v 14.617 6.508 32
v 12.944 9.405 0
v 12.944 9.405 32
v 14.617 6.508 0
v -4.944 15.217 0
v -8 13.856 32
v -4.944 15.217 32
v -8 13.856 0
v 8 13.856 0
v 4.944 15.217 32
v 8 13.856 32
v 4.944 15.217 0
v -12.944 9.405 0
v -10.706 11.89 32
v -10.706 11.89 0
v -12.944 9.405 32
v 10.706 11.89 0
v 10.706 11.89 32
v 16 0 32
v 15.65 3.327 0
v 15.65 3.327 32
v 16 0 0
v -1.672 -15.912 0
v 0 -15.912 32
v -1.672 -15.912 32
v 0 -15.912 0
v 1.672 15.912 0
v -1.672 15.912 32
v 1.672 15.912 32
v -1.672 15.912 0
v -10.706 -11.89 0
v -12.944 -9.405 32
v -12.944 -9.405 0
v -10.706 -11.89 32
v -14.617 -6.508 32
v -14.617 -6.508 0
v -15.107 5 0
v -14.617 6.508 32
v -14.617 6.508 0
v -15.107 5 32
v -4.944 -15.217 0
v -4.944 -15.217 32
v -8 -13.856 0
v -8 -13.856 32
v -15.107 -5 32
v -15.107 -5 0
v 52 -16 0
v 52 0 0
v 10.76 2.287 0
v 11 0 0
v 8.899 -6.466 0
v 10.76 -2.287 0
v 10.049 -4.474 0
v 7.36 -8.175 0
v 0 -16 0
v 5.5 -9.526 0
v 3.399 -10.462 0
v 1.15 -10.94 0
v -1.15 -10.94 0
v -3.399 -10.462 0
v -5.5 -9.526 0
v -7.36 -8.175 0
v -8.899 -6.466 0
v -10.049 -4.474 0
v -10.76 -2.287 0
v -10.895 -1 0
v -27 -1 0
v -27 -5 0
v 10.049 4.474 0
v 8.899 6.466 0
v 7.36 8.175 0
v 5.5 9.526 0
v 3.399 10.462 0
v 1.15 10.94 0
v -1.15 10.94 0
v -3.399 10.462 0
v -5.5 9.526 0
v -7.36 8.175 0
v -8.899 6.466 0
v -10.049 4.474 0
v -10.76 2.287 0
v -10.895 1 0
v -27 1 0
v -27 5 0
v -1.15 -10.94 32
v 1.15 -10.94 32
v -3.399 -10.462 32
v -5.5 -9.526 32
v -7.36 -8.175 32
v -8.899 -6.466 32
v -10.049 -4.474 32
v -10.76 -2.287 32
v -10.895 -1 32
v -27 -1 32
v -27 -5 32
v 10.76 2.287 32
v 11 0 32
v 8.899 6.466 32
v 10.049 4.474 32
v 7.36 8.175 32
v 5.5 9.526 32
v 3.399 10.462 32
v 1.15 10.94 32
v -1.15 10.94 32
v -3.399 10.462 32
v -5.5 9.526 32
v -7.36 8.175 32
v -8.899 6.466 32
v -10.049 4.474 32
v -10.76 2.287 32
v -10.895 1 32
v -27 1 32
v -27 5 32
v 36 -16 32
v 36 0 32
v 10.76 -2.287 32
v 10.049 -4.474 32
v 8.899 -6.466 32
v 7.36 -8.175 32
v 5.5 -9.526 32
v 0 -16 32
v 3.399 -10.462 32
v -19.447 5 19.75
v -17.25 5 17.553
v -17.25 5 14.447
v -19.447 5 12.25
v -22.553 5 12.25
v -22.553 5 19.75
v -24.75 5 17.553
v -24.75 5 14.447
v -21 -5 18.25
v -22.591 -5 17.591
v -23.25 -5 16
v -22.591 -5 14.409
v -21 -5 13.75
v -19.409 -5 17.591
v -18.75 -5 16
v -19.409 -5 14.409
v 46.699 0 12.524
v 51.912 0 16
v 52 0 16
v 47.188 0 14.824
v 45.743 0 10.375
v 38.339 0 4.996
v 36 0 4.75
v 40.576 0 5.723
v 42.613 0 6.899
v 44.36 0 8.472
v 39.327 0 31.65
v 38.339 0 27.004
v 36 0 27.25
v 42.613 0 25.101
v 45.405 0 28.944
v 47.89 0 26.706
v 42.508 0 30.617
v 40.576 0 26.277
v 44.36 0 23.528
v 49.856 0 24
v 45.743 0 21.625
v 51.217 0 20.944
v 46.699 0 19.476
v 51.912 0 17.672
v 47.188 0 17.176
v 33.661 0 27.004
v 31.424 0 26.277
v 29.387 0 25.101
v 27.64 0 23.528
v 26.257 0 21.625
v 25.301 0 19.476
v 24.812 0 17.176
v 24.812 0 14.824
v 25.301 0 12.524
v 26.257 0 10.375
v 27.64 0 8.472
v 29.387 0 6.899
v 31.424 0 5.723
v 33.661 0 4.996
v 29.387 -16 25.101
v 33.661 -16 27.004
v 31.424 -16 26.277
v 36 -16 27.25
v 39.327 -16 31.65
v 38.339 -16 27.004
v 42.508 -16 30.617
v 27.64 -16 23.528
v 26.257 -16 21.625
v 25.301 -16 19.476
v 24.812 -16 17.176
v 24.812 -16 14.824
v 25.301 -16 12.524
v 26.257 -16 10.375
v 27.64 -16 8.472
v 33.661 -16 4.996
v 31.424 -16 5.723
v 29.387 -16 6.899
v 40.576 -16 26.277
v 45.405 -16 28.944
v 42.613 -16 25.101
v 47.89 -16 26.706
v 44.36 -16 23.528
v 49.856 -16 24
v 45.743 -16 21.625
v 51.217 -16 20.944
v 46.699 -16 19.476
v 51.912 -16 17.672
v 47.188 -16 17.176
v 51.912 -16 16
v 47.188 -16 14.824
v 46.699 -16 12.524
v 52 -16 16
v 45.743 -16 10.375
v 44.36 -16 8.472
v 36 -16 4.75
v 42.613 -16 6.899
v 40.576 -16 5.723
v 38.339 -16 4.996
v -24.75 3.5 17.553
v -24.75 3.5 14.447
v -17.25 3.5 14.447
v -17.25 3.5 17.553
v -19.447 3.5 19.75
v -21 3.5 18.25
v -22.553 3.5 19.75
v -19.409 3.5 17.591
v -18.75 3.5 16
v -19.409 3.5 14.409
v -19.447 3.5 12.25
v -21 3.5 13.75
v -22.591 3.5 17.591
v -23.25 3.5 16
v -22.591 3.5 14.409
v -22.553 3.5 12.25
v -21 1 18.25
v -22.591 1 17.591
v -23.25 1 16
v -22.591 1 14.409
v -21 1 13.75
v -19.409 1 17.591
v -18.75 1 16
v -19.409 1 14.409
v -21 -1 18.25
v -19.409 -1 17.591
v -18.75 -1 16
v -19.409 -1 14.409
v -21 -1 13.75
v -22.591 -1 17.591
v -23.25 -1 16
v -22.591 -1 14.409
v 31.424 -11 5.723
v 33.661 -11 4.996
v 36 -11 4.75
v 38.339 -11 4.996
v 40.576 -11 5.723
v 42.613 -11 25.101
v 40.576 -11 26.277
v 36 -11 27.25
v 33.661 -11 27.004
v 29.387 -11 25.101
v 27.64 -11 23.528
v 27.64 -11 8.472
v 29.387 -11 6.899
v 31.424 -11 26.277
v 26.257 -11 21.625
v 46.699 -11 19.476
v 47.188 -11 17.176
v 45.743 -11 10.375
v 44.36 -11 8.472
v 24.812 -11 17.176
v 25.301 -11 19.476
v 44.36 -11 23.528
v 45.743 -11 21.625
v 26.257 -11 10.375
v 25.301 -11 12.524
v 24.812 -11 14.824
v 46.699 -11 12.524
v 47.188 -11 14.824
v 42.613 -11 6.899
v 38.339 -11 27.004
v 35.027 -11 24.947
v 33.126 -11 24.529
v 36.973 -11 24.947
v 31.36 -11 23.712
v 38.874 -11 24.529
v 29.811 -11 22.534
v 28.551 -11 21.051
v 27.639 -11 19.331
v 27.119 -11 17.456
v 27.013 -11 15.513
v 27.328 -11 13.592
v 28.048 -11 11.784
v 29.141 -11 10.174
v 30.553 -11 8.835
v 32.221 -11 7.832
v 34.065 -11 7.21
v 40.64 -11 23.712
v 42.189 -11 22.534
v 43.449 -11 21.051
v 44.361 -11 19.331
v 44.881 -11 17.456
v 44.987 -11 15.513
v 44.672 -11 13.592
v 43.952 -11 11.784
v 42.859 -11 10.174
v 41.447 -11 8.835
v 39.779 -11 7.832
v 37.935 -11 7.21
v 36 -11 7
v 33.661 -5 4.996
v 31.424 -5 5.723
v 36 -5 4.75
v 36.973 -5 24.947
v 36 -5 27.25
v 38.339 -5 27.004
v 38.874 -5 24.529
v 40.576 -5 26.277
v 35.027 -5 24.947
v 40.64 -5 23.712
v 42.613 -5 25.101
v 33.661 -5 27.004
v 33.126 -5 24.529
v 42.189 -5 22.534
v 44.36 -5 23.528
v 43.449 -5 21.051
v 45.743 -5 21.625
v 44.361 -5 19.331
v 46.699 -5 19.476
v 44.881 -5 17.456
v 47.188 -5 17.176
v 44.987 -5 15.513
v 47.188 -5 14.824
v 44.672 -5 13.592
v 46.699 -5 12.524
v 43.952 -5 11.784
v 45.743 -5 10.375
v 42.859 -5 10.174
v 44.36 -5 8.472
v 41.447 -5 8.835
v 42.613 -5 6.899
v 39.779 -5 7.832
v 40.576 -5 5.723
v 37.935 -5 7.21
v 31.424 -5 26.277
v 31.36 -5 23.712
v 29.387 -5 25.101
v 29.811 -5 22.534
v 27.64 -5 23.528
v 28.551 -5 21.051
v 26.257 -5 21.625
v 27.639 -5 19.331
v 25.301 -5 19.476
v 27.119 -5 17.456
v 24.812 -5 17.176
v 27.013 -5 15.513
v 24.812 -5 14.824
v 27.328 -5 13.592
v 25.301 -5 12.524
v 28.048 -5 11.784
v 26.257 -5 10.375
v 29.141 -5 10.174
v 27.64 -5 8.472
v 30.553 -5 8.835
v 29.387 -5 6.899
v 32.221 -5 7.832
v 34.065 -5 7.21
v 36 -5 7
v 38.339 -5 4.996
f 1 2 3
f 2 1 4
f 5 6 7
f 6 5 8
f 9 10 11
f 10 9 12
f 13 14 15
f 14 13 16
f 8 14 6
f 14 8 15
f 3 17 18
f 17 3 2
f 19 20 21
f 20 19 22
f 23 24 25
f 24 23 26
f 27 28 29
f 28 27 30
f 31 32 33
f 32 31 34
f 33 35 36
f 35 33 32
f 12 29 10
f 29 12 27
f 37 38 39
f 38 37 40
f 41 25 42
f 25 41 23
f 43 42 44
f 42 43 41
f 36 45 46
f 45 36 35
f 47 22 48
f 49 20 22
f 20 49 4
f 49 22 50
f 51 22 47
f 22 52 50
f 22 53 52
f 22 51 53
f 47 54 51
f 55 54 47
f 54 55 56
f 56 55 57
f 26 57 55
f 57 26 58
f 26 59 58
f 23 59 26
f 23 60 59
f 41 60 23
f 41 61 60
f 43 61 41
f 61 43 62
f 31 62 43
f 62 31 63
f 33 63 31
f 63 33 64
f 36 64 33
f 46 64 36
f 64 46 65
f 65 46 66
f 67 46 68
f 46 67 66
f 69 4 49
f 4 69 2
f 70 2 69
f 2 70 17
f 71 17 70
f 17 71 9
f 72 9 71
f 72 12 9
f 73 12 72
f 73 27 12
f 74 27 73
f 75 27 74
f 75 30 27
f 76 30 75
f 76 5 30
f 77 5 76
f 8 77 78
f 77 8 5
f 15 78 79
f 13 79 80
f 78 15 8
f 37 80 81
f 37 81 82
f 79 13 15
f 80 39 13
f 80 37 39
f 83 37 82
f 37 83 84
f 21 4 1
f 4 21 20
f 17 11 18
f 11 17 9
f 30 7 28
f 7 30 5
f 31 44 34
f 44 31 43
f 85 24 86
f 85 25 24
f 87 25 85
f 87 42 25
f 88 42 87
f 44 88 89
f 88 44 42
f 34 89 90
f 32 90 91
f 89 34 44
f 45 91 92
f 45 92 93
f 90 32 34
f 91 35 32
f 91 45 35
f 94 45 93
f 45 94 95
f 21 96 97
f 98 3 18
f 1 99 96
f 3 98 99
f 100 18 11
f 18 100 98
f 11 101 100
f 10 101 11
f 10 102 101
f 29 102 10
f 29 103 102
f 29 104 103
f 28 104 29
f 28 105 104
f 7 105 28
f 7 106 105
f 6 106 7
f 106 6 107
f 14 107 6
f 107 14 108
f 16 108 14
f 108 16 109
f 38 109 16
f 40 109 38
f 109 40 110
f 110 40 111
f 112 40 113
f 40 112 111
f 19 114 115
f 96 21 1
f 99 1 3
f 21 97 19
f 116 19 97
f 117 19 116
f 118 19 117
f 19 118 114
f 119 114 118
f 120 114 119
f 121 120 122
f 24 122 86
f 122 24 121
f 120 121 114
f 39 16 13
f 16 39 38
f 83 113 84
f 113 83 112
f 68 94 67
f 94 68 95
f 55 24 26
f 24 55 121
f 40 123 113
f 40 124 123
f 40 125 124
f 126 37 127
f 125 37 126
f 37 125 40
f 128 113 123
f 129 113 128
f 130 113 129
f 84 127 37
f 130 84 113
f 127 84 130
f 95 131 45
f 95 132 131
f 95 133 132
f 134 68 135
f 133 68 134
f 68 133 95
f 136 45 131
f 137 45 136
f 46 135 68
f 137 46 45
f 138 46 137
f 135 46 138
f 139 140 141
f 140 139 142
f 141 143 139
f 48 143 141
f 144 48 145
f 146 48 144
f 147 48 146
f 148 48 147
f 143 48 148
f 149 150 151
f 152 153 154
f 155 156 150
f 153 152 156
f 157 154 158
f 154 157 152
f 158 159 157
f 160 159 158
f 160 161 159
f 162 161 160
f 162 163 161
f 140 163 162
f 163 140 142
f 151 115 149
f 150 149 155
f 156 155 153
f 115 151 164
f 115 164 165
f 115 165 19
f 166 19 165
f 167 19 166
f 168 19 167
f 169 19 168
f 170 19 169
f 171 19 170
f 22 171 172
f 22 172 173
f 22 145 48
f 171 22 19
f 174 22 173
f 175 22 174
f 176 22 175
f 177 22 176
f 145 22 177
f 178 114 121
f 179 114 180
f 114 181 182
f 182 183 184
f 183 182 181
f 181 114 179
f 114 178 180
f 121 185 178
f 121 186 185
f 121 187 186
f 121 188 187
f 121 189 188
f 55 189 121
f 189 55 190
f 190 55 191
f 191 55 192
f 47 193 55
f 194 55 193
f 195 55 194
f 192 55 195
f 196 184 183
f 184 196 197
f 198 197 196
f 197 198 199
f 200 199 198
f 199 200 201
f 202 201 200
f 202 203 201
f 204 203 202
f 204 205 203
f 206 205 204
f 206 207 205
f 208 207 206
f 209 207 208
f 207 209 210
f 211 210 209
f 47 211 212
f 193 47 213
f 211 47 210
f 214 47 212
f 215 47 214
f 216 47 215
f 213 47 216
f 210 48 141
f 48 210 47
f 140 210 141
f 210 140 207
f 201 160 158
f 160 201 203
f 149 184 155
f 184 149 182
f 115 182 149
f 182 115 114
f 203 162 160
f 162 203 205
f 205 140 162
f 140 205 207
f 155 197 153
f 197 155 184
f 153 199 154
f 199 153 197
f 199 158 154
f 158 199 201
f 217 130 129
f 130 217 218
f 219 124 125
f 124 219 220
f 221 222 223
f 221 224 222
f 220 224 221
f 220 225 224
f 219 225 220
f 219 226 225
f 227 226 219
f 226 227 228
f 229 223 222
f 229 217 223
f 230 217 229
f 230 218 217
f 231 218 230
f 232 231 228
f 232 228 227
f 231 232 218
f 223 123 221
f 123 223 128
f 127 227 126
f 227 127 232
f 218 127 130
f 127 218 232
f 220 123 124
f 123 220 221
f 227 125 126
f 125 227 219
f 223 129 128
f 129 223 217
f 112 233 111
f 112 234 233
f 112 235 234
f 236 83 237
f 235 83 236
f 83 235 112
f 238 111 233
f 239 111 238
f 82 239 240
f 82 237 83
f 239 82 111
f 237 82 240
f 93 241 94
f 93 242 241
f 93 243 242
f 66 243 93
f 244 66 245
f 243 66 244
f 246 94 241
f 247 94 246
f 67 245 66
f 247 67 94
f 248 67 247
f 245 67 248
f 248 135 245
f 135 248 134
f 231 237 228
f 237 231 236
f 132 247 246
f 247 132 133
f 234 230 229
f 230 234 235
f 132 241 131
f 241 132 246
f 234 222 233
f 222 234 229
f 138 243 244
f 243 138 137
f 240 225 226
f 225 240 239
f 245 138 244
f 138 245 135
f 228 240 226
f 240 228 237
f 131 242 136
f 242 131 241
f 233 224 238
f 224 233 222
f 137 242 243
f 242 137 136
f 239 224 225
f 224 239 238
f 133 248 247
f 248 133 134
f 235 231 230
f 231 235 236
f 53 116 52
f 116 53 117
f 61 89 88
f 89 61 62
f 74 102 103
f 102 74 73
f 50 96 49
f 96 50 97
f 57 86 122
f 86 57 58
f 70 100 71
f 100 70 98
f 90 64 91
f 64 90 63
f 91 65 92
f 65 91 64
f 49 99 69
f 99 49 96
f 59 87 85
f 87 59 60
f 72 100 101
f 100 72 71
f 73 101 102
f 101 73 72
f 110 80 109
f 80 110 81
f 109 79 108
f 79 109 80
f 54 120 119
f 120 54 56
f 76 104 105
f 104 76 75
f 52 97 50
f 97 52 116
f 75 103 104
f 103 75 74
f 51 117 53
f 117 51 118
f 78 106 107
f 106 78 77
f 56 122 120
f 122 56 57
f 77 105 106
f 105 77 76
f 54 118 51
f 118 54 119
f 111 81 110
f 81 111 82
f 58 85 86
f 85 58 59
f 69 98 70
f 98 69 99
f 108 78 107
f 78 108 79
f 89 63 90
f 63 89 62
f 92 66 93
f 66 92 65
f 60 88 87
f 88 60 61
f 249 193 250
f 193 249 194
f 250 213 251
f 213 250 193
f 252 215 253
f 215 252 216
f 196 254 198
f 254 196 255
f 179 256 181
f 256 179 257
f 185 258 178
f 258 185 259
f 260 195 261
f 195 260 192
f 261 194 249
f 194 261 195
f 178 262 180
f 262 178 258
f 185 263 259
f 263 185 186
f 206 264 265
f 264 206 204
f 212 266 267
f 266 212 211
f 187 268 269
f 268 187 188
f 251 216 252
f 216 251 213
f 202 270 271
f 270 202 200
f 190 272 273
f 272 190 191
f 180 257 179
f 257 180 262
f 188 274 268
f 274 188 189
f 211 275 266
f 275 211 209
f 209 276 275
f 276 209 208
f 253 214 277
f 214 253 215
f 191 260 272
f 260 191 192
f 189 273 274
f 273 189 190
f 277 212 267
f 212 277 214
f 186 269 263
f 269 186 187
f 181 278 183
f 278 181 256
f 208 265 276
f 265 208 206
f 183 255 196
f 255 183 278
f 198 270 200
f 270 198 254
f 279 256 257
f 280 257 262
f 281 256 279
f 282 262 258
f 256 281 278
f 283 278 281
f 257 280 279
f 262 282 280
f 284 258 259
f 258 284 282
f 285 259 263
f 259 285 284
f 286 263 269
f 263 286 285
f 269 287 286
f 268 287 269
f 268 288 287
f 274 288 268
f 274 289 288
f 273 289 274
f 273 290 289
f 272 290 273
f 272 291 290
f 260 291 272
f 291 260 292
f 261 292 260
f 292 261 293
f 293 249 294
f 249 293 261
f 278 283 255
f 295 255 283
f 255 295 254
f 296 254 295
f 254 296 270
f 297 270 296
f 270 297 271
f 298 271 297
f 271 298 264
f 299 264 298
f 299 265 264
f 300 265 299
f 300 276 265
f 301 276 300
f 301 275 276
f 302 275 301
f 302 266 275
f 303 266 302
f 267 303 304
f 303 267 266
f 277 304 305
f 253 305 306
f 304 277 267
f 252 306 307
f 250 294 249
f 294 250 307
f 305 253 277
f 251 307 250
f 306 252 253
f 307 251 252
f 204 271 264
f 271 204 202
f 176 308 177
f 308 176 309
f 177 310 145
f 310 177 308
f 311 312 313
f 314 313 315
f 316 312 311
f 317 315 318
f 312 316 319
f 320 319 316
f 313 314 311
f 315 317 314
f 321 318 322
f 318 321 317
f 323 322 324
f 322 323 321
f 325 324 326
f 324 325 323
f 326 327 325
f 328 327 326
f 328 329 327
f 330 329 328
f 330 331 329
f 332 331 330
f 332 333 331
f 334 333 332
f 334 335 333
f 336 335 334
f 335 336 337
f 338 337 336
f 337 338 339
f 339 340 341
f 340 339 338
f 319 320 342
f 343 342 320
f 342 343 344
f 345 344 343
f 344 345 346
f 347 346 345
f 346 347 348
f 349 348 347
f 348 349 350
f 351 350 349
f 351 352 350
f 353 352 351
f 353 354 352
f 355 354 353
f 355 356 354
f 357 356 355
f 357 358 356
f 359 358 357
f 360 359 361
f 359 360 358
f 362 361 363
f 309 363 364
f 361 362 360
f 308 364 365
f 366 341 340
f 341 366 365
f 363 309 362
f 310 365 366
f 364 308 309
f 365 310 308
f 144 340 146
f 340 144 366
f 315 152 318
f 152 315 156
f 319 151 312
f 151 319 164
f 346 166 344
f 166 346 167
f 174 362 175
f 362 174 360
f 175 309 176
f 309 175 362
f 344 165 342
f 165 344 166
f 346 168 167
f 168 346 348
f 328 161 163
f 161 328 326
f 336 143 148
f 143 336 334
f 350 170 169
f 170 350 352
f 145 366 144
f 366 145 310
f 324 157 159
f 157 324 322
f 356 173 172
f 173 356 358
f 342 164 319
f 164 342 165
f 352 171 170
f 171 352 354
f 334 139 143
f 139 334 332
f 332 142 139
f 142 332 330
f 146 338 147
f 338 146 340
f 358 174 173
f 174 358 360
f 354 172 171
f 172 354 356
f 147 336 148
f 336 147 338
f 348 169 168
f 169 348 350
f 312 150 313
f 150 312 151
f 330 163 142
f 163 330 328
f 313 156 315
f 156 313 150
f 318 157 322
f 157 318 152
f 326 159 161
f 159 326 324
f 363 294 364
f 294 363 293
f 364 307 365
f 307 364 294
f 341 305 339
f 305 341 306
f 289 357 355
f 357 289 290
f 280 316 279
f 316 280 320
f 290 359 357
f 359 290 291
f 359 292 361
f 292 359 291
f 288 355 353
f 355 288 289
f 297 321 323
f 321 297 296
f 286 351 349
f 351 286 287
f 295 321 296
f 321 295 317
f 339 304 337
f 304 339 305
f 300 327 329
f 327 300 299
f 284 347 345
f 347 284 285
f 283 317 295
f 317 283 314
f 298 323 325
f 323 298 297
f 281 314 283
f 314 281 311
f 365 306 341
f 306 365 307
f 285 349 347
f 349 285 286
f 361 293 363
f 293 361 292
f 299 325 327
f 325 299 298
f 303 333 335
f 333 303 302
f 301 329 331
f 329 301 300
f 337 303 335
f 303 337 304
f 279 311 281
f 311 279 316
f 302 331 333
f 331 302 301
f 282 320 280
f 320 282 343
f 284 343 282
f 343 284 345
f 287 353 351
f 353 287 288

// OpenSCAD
// RollerDog Wheel Adapters

arm_length=20;
nut_size=7.5;
bolt_diameter=4.5;
cube_size=32;
top_lip_height=11;
lip_width=10;
wheel_bolt_diameter=18;
bearing_diameter=22.5;
edge_room=3;
pipe_diameter=22;

module nut() {
	intersection_for (i=[0,45]) {
		rotate([i,0])
			cube([3,nut_size,nut_size],center=true);
	}
}

module pvc_pipe() {
	rotate([0,90,0])
		cylinder(d=pipe_diameter,h=40,center=true);
}

module bearing() {
	cylinder(d=bearing_diameter,h=10,center=true);
}

module wheel_adapter() {
	translate([0,0,cube_size/2])
	rotate([0,90,0])
	difference() {
		union() {
			rotate([00,90,0])
				cylinder(d=cube_size,h=cube_size,center=true);
			translate([0,0,(top_lip_height+cube_size/2)/2])
				cube([cube_size,lip_width,top_lip_height+cube_size/2],center=true);
			translate([0,-cube_size/4,(-arm_length-cube_size/2)/2])
				cube([cube_size,cube_size/2,arm_length+cube_size/2],center=true);
			translate([cube_size/4,-cube_size/4,-arm_length-cube_size/2])
				cube([cube_size/2,cube_size/2,cube_size],center=true);
			translate([0,-cube_size/4,-arm_length-cube_size/2])
				rotate([90,0,0])
				cylinder(d=cube_size,h=cube_size/2,center=true);
		}
		// Gap
		translate([0,0,20])
			cube([35,2,40],center=true);
		// Nut Hole
		translate([0,5,cube_size/2+top_lip_height/2-0.5])
			rotate([0,0,90]) 
				nut();
		// Bolt Hole
		translate([0,0,cube_size/2+top_lip_height/2-0.5])
			rotate([90,0,0]) 
				cylinder(d=bolt_diameter,h=20,center=true);
		// Pipe Hole
		pvc_pipe();
		// Bearing Holes
		translate([0,-cube_size/2,-arm_length-cube_size/2])
			rotate([90,0,0]) 
			bearing();
		translate([0,0,-arm_length-cube_size/2])
			rotate([90,0,0]) 
			bearing();
		// Bearing Inner Hole
		translate([0,0,-arm_length-cube_size/2])
			rotate([90,0,0]) 
				cylinder(d=wheel_bolt_diameter,h=60,center=true);	
	}
}

mirror([1,0,0])
	wheel_adapter();
